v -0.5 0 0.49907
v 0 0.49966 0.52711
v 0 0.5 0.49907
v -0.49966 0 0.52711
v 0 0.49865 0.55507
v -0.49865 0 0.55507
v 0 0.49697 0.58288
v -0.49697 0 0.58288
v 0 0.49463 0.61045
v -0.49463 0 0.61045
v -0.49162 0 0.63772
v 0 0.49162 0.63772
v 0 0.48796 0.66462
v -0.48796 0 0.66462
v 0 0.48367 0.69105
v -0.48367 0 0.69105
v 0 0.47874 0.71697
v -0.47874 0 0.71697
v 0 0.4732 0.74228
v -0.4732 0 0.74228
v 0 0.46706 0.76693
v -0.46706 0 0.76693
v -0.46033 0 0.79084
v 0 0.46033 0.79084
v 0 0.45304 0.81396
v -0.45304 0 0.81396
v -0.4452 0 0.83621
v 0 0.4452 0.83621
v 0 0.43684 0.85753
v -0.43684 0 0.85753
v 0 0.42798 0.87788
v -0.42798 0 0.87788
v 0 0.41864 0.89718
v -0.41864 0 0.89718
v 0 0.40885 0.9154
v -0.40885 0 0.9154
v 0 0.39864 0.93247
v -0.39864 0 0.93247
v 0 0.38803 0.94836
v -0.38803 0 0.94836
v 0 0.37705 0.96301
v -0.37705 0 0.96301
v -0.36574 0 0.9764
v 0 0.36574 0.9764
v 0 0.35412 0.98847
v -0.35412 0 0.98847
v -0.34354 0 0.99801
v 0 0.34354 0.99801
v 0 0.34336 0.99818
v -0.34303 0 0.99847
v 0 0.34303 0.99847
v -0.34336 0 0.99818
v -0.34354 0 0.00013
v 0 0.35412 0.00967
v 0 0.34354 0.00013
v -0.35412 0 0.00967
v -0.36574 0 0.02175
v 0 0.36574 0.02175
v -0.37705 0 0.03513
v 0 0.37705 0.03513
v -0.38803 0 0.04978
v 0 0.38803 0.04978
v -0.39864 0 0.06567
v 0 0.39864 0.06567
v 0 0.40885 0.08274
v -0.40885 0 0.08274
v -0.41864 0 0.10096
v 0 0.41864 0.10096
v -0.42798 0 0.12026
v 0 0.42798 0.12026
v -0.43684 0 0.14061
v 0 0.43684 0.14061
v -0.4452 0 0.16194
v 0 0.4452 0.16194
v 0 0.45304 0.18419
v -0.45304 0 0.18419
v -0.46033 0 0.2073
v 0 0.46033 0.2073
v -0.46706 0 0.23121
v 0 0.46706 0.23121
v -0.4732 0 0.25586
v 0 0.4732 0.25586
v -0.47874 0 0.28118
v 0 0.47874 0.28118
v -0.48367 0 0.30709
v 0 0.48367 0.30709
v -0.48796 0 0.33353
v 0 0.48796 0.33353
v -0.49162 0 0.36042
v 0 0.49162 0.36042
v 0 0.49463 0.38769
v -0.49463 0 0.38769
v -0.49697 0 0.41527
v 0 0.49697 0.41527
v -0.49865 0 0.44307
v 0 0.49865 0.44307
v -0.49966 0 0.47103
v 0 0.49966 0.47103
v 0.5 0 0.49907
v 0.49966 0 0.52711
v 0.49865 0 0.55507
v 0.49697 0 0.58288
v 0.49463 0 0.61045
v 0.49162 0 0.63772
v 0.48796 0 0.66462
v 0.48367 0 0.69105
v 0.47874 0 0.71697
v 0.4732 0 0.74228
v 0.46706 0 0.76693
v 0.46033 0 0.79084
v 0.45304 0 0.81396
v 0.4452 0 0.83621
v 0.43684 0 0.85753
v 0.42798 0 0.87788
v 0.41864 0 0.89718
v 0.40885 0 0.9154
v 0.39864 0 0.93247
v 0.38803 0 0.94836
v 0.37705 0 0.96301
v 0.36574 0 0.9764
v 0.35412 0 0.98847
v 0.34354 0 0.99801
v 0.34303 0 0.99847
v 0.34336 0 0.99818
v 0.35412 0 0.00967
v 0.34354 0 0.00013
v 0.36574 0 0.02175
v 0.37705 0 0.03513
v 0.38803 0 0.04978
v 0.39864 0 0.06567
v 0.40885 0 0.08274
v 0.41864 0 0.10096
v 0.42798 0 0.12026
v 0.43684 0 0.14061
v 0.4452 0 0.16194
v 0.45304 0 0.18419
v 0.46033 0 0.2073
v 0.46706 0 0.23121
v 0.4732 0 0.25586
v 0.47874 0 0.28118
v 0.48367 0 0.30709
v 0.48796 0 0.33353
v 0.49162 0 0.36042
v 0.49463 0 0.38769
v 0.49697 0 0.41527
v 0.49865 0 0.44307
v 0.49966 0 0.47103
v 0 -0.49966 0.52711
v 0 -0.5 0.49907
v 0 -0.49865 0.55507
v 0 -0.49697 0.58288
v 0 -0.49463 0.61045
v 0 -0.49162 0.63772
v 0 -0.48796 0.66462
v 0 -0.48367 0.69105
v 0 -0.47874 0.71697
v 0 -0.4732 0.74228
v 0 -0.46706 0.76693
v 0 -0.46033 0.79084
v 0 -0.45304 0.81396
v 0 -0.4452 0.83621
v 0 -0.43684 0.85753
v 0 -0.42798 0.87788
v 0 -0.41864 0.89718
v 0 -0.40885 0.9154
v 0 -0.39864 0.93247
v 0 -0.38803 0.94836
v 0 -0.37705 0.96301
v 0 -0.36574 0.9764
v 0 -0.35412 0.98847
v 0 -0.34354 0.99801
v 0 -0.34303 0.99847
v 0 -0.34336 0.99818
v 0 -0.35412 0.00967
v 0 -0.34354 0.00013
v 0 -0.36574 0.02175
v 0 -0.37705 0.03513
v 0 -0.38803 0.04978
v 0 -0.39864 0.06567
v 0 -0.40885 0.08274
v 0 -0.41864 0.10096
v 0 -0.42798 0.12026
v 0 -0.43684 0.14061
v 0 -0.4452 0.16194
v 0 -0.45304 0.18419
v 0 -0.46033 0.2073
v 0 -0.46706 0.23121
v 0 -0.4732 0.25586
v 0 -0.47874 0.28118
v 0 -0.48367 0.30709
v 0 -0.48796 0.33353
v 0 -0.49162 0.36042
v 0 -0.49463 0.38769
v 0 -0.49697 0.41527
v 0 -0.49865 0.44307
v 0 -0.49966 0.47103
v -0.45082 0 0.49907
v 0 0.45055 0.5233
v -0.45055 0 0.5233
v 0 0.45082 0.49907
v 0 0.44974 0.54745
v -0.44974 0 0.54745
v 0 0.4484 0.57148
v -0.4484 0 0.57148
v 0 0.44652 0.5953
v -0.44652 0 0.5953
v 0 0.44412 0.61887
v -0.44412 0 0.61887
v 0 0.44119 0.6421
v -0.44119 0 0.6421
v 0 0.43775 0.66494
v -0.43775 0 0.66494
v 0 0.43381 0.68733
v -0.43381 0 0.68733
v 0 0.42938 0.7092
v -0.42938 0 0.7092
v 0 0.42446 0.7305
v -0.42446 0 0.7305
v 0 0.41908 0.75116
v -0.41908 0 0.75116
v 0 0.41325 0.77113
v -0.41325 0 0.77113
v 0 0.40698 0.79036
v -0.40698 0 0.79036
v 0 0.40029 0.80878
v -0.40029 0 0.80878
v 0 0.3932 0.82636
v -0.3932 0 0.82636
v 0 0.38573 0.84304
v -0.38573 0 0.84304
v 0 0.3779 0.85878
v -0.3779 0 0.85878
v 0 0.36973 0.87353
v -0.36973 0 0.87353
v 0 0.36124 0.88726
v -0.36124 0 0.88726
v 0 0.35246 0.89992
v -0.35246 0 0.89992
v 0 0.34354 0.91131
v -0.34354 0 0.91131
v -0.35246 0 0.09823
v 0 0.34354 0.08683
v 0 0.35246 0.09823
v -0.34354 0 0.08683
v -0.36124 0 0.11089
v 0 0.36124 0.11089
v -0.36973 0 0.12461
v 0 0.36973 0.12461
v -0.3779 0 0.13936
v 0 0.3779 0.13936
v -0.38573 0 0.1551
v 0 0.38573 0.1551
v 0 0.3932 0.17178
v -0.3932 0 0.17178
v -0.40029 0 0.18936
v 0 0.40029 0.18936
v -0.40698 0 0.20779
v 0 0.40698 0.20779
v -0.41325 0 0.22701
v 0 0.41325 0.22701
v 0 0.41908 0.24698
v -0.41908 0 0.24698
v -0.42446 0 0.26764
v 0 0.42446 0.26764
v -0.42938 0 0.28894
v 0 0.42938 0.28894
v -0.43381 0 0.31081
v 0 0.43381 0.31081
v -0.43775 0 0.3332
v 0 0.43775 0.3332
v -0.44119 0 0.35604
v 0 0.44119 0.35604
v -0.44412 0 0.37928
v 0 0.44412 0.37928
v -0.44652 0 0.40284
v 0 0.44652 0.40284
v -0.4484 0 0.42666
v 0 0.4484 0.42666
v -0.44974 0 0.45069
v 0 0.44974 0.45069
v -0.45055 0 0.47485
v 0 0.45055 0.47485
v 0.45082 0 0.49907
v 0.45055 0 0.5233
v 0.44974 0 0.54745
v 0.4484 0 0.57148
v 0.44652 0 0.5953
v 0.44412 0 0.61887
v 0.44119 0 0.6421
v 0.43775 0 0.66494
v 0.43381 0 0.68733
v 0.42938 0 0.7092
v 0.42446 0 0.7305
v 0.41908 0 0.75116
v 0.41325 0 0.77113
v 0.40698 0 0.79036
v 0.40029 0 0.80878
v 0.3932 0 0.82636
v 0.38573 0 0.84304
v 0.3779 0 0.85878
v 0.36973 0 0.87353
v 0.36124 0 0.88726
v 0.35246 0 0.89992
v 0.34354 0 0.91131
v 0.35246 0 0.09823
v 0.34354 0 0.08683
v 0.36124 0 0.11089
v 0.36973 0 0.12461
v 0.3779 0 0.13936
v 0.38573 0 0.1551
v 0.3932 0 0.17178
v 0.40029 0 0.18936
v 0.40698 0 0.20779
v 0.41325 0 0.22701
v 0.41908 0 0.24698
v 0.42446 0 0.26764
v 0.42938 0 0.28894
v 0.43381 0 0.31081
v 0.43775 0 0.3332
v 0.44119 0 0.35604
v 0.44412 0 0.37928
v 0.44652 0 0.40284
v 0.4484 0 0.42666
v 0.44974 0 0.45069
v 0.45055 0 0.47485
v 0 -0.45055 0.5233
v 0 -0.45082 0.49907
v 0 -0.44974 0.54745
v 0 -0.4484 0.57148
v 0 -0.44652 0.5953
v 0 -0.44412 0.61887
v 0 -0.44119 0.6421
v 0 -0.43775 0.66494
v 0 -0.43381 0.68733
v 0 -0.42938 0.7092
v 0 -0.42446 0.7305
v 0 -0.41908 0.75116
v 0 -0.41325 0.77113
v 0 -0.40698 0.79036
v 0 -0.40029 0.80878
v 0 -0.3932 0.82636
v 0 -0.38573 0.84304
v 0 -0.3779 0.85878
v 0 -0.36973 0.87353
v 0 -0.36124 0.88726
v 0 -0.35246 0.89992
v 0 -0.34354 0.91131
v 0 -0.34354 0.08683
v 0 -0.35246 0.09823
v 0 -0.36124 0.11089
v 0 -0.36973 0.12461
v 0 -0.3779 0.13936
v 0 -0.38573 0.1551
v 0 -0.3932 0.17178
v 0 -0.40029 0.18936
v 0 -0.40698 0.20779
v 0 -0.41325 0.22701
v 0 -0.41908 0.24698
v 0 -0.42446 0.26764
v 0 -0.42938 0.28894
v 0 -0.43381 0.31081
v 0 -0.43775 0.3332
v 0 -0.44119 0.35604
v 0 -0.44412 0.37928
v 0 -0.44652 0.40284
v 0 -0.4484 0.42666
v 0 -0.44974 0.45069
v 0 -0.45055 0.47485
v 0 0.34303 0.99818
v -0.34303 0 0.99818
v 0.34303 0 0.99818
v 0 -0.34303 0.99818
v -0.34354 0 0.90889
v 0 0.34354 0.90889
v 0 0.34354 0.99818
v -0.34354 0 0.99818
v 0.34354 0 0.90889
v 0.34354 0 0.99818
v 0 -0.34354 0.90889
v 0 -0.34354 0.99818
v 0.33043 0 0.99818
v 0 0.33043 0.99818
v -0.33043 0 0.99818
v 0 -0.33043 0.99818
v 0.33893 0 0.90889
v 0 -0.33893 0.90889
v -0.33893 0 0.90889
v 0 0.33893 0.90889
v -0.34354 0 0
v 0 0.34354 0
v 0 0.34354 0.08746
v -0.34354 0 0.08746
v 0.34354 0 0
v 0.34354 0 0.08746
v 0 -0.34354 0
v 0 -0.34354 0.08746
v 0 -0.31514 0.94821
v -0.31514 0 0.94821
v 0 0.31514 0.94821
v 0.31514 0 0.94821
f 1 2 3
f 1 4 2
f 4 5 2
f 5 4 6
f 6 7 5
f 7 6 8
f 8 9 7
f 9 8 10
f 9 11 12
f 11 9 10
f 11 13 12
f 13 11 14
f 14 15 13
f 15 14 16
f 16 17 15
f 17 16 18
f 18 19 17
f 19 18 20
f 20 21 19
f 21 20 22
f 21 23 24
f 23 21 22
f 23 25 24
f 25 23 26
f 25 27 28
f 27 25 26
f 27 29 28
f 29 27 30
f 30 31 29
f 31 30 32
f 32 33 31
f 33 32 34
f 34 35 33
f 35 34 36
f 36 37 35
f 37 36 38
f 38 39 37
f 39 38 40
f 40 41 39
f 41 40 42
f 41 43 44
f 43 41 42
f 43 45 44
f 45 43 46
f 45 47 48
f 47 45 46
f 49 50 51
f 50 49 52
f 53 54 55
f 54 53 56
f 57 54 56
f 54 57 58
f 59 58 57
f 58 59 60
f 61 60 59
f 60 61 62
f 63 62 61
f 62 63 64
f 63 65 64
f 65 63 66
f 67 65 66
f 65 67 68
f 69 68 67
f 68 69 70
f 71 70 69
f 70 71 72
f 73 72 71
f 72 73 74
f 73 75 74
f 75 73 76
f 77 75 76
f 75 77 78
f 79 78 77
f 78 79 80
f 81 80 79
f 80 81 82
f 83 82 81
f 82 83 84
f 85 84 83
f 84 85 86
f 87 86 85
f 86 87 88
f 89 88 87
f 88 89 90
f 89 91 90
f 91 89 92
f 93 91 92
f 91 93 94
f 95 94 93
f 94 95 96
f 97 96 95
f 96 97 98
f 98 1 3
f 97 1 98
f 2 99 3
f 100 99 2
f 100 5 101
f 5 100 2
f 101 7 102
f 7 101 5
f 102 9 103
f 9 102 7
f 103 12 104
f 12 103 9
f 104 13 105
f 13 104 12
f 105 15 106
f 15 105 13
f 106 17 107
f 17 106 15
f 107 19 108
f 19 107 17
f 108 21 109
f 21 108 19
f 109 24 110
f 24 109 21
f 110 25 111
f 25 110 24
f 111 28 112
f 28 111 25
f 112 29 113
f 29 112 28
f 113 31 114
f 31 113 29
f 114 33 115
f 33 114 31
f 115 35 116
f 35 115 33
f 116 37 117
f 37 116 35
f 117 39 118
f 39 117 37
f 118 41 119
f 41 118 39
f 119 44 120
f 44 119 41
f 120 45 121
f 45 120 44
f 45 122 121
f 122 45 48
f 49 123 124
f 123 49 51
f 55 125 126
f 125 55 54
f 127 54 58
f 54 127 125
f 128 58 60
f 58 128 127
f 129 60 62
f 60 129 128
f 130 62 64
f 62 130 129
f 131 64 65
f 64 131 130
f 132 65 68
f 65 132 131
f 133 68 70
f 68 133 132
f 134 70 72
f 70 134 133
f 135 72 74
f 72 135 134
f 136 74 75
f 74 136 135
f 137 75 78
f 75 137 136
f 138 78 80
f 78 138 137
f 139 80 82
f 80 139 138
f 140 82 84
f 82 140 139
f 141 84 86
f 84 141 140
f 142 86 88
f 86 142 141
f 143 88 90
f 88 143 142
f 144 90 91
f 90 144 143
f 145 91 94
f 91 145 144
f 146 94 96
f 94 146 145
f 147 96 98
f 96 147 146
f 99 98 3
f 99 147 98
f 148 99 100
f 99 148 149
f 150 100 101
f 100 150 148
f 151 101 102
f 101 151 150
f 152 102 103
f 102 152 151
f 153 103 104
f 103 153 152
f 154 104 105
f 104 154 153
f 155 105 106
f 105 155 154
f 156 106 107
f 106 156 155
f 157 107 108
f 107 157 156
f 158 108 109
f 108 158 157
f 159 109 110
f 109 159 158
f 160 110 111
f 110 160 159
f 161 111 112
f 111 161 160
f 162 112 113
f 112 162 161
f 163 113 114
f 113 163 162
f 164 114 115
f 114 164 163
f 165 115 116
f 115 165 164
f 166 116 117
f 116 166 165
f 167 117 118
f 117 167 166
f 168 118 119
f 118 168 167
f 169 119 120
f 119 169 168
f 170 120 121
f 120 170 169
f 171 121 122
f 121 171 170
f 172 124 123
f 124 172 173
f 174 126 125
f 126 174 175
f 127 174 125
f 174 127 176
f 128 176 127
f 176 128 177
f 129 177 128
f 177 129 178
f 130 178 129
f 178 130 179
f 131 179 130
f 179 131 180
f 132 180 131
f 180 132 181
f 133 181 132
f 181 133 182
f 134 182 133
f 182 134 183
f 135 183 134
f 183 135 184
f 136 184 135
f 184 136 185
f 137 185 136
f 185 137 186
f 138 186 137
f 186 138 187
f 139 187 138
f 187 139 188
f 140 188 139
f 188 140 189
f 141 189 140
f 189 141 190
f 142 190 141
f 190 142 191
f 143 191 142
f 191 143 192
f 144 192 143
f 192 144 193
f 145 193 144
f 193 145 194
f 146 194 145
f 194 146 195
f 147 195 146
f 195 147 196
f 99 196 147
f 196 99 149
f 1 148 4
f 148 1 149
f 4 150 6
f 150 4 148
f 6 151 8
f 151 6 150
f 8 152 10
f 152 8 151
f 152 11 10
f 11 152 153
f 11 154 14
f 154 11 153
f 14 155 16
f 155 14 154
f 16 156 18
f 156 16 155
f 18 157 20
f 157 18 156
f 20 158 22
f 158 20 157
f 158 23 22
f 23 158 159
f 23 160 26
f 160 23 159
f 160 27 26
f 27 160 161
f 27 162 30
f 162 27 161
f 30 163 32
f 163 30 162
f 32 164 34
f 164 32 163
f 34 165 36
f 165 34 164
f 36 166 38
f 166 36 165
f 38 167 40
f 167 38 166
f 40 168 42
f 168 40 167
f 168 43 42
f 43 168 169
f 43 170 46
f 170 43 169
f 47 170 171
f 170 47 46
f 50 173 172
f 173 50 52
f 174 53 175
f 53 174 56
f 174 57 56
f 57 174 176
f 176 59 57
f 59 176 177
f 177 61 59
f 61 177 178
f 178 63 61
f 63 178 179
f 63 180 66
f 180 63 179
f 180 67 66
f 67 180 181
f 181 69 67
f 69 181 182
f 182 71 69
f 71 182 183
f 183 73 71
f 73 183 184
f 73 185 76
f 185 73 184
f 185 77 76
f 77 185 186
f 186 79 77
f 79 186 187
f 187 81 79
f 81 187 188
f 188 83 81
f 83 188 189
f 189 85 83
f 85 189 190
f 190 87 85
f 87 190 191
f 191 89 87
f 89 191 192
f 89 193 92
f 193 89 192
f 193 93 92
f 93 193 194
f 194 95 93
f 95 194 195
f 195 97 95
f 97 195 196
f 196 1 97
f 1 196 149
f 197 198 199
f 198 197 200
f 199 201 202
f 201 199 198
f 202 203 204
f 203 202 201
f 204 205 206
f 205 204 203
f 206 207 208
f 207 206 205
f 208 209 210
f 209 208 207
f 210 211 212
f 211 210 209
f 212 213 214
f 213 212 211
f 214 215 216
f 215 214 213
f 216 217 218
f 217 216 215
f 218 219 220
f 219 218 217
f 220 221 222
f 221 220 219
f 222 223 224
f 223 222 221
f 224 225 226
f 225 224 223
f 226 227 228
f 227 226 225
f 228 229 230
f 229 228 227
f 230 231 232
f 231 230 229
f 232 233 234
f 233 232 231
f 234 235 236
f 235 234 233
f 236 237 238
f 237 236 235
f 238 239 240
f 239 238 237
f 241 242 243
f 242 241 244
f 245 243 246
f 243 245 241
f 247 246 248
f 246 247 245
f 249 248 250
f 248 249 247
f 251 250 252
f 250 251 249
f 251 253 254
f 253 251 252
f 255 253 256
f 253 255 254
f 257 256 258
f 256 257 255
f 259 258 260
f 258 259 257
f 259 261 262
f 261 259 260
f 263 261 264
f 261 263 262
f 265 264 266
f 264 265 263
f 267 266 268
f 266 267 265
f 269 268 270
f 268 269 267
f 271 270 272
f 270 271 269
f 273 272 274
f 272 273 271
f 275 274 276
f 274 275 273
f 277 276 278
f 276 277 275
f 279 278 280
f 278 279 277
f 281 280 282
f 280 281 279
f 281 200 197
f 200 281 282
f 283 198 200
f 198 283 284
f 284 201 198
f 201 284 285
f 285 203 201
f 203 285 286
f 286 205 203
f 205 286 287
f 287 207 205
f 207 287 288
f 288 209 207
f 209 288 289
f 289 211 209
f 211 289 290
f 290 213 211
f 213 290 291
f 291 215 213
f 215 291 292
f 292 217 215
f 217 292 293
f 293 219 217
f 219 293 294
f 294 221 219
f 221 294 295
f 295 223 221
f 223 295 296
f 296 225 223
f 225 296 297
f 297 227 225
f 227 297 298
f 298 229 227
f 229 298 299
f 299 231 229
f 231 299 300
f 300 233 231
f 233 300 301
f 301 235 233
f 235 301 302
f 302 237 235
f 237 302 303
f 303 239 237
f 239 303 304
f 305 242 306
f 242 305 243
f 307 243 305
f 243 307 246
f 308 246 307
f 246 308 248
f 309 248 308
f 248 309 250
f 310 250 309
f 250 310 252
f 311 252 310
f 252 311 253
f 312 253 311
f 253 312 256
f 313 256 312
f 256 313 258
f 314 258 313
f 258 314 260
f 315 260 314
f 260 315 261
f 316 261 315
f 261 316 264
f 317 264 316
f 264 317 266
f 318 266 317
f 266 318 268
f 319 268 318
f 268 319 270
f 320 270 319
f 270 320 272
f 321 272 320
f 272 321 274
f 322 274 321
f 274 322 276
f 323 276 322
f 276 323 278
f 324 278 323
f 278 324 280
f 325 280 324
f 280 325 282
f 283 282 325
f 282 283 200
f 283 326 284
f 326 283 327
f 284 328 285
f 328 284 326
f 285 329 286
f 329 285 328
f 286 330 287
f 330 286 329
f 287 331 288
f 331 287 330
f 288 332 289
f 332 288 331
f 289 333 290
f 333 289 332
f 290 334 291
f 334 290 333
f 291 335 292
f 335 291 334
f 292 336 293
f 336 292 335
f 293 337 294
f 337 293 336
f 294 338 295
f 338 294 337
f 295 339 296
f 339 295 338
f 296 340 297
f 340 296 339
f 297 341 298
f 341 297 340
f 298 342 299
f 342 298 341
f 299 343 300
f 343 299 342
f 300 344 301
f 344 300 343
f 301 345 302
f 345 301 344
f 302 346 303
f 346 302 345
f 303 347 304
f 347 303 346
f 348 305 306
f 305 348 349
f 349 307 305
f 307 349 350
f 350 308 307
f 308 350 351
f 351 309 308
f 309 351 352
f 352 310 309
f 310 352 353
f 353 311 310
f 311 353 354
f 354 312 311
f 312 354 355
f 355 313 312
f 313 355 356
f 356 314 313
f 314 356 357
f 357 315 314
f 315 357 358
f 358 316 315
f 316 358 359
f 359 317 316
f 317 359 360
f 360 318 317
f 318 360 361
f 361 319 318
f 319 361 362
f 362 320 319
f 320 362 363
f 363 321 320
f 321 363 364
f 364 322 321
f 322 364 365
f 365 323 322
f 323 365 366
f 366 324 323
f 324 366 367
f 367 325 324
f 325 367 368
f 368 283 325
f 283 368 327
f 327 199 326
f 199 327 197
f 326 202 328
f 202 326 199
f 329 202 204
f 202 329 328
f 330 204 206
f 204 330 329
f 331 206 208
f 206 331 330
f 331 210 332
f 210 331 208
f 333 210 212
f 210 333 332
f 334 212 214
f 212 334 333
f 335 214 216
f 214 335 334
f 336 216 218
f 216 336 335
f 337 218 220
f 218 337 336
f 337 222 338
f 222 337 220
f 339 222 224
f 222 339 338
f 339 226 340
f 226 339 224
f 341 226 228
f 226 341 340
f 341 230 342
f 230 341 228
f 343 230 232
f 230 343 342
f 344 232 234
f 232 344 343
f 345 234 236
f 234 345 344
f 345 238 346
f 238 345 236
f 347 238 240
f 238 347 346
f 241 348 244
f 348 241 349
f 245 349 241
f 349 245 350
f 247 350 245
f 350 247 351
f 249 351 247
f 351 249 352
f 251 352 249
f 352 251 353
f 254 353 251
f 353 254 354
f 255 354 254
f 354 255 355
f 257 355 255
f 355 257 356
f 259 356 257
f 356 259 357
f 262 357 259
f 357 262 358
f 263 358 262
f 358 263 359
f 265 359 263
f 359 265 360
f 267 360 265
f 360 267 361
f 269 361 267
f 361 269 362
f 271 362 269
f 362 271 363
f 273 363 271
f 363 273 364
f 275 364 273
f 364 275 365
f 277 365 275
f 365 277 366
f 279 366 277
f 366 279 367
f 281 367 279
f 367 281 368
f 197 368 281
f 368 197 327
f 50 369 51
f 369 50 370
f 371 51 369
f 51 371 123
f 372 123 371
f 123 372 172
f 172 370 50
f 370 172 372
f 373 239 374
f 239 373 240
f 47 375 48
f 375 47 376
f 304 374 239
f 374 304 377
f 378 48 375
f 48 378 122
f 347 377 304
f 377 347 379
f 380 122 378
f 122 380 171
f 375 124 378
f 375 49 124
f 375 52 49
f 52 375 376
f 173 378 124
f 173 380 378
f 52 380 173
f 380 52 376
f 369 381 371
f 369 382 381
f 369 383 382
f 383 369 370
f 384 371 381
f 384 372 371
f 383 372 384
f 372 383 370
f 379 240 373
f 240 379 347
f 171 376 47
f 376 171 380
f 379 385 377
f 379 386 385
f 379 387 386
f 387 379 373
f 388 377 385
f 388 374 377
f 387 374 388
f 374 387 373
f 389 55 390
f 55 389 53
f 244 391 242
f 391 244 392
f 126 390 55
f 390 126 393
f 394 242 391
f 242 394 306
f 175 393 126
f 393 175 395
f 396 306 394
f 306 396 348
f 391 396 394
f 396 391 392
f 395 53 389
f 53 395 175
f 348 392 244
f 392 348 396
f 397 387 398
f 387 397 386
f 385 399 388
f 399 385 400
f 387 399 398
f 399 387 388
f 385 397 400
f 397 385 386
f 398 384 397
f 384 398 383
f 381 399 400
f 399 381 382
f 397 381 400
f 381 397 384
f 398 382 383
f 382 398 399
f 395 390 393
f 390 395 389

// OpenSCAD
// [FL_INDEX: keywords="openscad, 3d_parametric, Customizer-able_Containers, csg_solid" | COT="Parametric OpenSCAD design from 3DCodeverse"]
// Title: Customizer-able Containers


// The shape of pot you'd like
potShape = 0; // [0:14]

// The number of sides (0 for Cylindrical)
numberSides = 4; // [0:100]

drawReceptacle(potShape,numberSides);

module hSphere(r=1,t=0.1,ns,rot) {
	difference() {
		sphere(r);
		sphere(r-t);
	}
}

rotationList=[0,0,0,60,0,-36,60,180/7,0,-20,36,180/11,0,-180/13,180/7,12,0,0,0,0,0,0];

module drawReceptacle(number,sides) {
	ns=(sides<3)?100:sides;
	rotby=(ns>20)?0:rotationList[ns];

		if (number==1) { receptacle3(ns,rotby);
	} else if (number==2) { receptacle1(ns,rotby);
	} else if (number==3) { receptacle2(ns,rotby);
	} else if (number==4) { receptacle5(ns,rotby);
	} else if (number==5) { receptacle6(ns,rotby);
	} else if (number==6) { receptacle7(ns,rotby);
	} else if (number==7) { receptacle4(ns,rotby);
	} else if (number==8) { receptacle8(ns,rotby);
	} else if (number==9) { receptacle9(ns,rotby);
	} else if (number==10) { receptacle10(ns,rotby);
	} else if (number==11) { receptacle11(ns,rotby);
	} else if (number==12) { receptacle14(ns,rotby);
	} else if (number==13) { receptacle12(ns,rotby);
	} else if (number==14) { receptacle13(ns,rotby);
	} else { 
		 receptacle0(ns,rotby);
	}	
}

diameter=50;
height=100;
quality=120;
$fn=quality;
numbsides=100; rotation=0;


module hSphere(r=1,t=0.1,ns,rot) {
	difference() {
		sphere(r);
		sphere(r-t);
	}
}
module hTorus(r=1,t=0.1,ns,rot) {
	scale([1,1,2])difference() {
		rotate([0,0,rot]) rotate_extrude(convexity=15,$fn=ns) translate([r*2/3, 0, 0]) circle(r/3,$fn=quality); 
		rotate([0,0,rot]) scale([1,1,1.2])rotate_extrude(convexity=15,$fn=ns) translate([r*2/3, 0, 0]) circle(r/3-t,$fn=quality); 
	}
}
module nTorus(r=1,t=0.1,ns,rot) {
	scale([1,1,2])difference() {
		rotate([0,0,rot]) rotate_extrude(convexity=15,$fn=ns) translate([r*2/3, 0, 0]) circle(r/3,$fn=quality); 
		rotate([0,0,rot]) scale([1,1,1.1])rotate_extrude(convexity=15,$fn=ns) translate([r*2/3, 0, 0]) circle(r/3-t,$fn=quality); 
	}
}

module receptacle0(ns,rot) {
	intersection() { translate([0,0,0.5])cube(1,center=true);
		scale([1/122,1/122,1/112])translate([0,0,-2.64])difference() {
			scale([1,1,2]) translate([0,0,((30+6)*2*0.813)/2]) union() {
				difference() {
					rotate([0,0,rot]) { rotate_extrude(convexity = 10,$fn=ns) translate([31, 0, 0]) circle(30,$fn=quality);  }
					rotate([0,0,rot]) { scale([1,1,1.08]) rotate_extrude(convexity = 10,$fn=ns) translate([31, 0, 0]) circle(24,$fn=quality); }
					cylinder(31*2.5,31*1.35,31*1.35,center=true,$fn=ns);
				}
				translate([0,0,22.95])cylinder(5,31*1.352,31*1.352,$fn=ns);
				translate([0,0,0-27.95])cylinder(4.9,31*1.352,31*1.352,$fn=ns);
			}
			translate([0,0,108])cylinder(9.1,42,36,center=true,$fn=ns);
			translate([0,0,112])cylinder(9,38,41,center=true,$fn=ns);
		}
	}
}
module receptacle1(ns,rot) {
	intersection() { translate([0,0,0.5])cube(1,center=true);
		scale([1/2,1/2,1/2])translate([0,0,0.5]) union() {
			difference() {
				hTorus(1,0.1,ns,rot);
				cylinder(1.8,0.83,0.83,center=true,$fn=ns);
			}
			scale([1.67,1.67,1]) translate([0,0,-0.5275]) cylinder(0.1,0.498,0.498,center=true,$fn=ns);
		
			difference() {
				union() {
					scale([1.67,1.67,1]) translate([0,0,0.96])  {
						intersection() {
							hTorus(1,0.1,ns,rot);
							cylinder(1.5,0.5,0.5,center=true,$fn=ns);
						}
					}
					rotate([0,0,rot]) translate([0,0,1.442])rotate_extrude(convexity = 10,$fn=ns) translate([0.83, 0, 0]) scale([0.4,1,1])circle(0.1,$fn=quality); 
				}
				union() {
					translate([0,0,0.6])cylinder(0.5,0.85,0.61,center=true,$fn=ns);
					translate([0,0,0.05])cylinder(0.6,0.85,0.85,center=true,$fn=ns);
				}
			}
		}
	}
}
module receptacle2(ns,rot) {
	intersection() { translate([0,0,0.5])cube(1,center=true);
		scale([1/2,1/2,1/3])translate([0,0,0.5]) union() {
			difference() {
				hTorus(1,0.1,ns,rot);
				cylinder(1.8,0.83,0.83,center=true,$fn=ns);
			}
			scale([1.67,1.67,1]) translate([0,0,-0.5275]) cylinder(0.1,0.498,0.498,center=true,$fn=ns);
		
			difference() {
				scale([1,1,2]) union() {
					scale([1.67,1.67,1]) translate([0,0,0.96+((2-1)*-0.29)])  {
						intersection() {
							hTorus(1,0.1,ns,rot);
							cylinder(1.5,0.5,0.5,center=true,$fn=ns);
						}
					}
					rotate([0,0,rot]) translate([0,0,1.442+((2-1)*-0.29)])rotate_extrude(convexity = 10,$fn=ns) translate([0.83, 0, 0]) scale([0.4,1,1])circle(0.1,$fn=quality); 
				}
				union() {
					translate([0,0,0.6])cylinder(0.5,0.85,0.61,center=true,$fn=ns);
					translate([0,0,0.05])cylinder(0.6,0.85,0.85,center=true,$fn=ns);
				}
			}
		}
	}
}
module receptacle3(ns,rot) {
	intersection() { translate([0,0,0.5])cube(1,center=true);
		scale([1/2,1/2,1/1.75])translate([0,0,0.5]) union() {
			difference() {
				hTorus(1,0.1,ns,rot);
				cylinder(1.8,0.83,0.83,center=true,$fn=ns);
			}
			scale([1.67,1.67,1]) translate([0,0,-0.5275]) cylinder(0.1,0.498,0.498,center=true,$fn=ns);
		
			difference() {
				scale([1,1,0.7]) union() {
					scale([1.67,1.67,1]) translate([0,0,1.215])  {
						intersection() {
							hTorus(1,0.1,ns,rot);
							cylinder(1.5,0.5,0.5,center=true,$fn=ns);
						}
					}
					rotate([0,0,rot]) translate([0,0,1.697])rotate_extrude(convexity = 10,$fn=ns) translate([0.83, 0, 0]) scale([0.4,1,1])circle(0.1,$fn=quality); 
				}
				union() {
					translate([0,0,0.6])cylinder(0.5,0.85,0.61,center=true,$fn=ns);
					translate([0,0,0.05])cylinder(0.6,0.85,0.85,center=true,$fn=ns);
				}
			}
		}
	}
}
module receptacle4(ns,rot) {
	intersection() {
		scale([0.5,0.5,0.47])translate([0,0,0.57]) union() {
			difference() {
				hTorus(1,0.1,ns,rot);
				translate([0,0,-1.38])cylinder(1.8,0.83,0.83,center=true,$fn=ns);
				cylinder(1.8,0.65,0.65,center=true,$fn=ns);
				translate([0,0,0.5])cylinder(1,1.1,1.1,center=true,$fn=ns);
			}
			scale([1.67,1.67,1]) translate([0,0,-0.5275]) cylinder(0.1,0.498,0.498,center=true,$fn=ns);
			translate([0,0,0.75])difference() {
				cylinder(1.5,1,1,center=true,$fn=ns);
				cylinder(2,0.9,0.9,center=true,$fn=ns);
			}
			rotate([0,0,rot]) translate([0,0,1.5])rotate_extrude(convexity = 10,$fn=ns) translate([0.95, 0, 0]) circle(0.05,$fn=quality); 
		}
		translate([0,0,0.5]) cube(1,center=true);
	}
}
module receptacle5(ns,rot) {
	intersection() {
		scale([0.39,0.39,0.445])translate([0,0,0.5752]) union() {
			difference() {
				hTorus(1,0.1,ns,rot);
				translate([0,0,-1.38])cylinder(1.8,0.83,0.83,center=true,$fn=ns);
				cylinder(1.8,0.65,0.65,center=true,$fn=ns);
				translate([0,0,0.5])cylinder(1,1.1,1.1,center=true,$fn=ns);
			}
			scale([1.67,1.67,1]) translate([0,0,-0.5275]) cylinder(0.1,0.498,0.498,center=true,$fn=ns);
			translate([0,0,0.5])difference() {
				cylinder(1,1,1,center=true,$fn=ns);
				cylinder(2,0.9,0.9,center=true,$fn=ns);
			}
			rotate([0,0,rot]) translate([0,0,1.61])rotate_extrude(convexity = 10,$fn=ns) translate([1.24, 0, 0]) scale([1,3,1])circle(0.025,$fn=quality); 
			scale([2.515,2.515,2])translate([0,0,0.25]) intersection() {
					nTorus(1,0.041,ns,rot);
					cylinder(1.5,0.5,0.5,center=true,$fn=ns);
					translate([0,0,0.5])cylinder(0.5,1,1,center=true,$fn=ns);
				}
		}
		translate([0,0,0.5]) cube(1,center=true);
	}
}
module receptacle6(ns,rot) {
	intersection() {
		scale([0.39,0.39,0.57])translate([0,0,0.5752]) union() {
			difference() {
				hTorus(1,0.1,ns,rot);
				translate([0,0,-1.38])cylinder(1.8,0.83,0.83,center=true,$fn=ns);
				cylinder(1.8,0.65,0.65,center=true,$fn=ns);
				translate([0,0,0.5])cylinder(1,1.1,1.1,center=true,$fn=ns);
			}
			scale([1.67,1.67,1]) translate([0,0,-0.5275]) cylinder(0.1,0.498,0.498,center=true,$fn=ns);
			translate([0,0,0.25])difference() {
				cylinder(0.5,1,1,center=true,$fn=ns);
				cylinder(2,0.9,0.9,center=true,$fn=ns);
			}
			rotate([0,0,rot]) translate([0,0,1.11])rotate_extrude(convexity = 10,$fn=ns) translate([1.24, 0, 0]) scale([1,3,1])circle(0.025,$fn=quality); 
			scale([2.515,2.515,2])translate([0,0,0]) intersection() {
					nTorus(1,0.041,ns,rot);
					cylinder(1.5,0.5,0.5,center=true,$fn=ns);
					translate([0,0,0.5])cylinder(0.5,1,1,center=true,$fn=ns);
				}
		}
		translate([0,0,0.5]) cube(1,center=true);
	}
}
module receptacle7(ns,rot) {
	intersection() {
		scale([0.39,0.39,0.8])translate([0,0,0.5752]) union() {
			difference() {
				hTorus(1,0.1,ns,rot);
				translate([0,0,-1.38])cylinder(1.8,0.83,0.83,center=true,$fn=ns);
				cylinder(1.8,0.65,0.65,center=true,$fn=ns);
				translate([0,0,0.5])cylinder(1,1.1,1.1,center=true,$fn=ns);
			}
			scale([1.67,1.67,1]) translate([0,0,-0.5275]) cylinder(0.1,0.498,0.498,center=true,$fn=ns);
			rotate([0,0,rot]) translate([0,0,0.61])rotate_extrude(convexity = 10,$fn=ns) translate([1.24, 0, 0]) scale([1,3,1])circle(0.025,$fn=quality); 
			scale([2.515,2.515,2])translate([0,0,-0.25]) intersection() {
					nTorus(1,0.041,ns,rot);
					cylinder(1.5,0.5,0.5,center=true,$fn=ns);
					translate([0,0,0.5])cylinder(0.5,1,1,center=true,$fn=ns);
				}
		}
		translate([0,0,0.5]) cube(1,center=true);
	}
}
module receptacle8(ns,rot) {
	intersection() {
		scale([0.5,0.5,0.48])translate([0,0,0.5]) union() {
			translate([0,0,0.25])difference() {
				cylinder(1.5,1,1,center=true,$fn=ns);
				cylinder(2,0.9,0.9,center=true,$fn=ns);
			}
			translate([0,0,-0.45]) cylinder(0.1,1,1,center=true,$fn=ns);
			translate([0,0,1])rotate([180,0,0])difference() {
				hTorus(1,0.1,ns,rot);
				translate([0,0,-1.25])cylinder(1.8,0.83,0.83,center=true,$fn=ns);
				cylinder(1.8,0.65,0.65,center=true,$fn=ns);
				translate([0,0,0.5])cylinder(1,1.1,1.1,center=true,$fn=ns);
			}
			rotate([0,0,rot]) translate([0,0,1.493])rotate_extrude(convexity = 10,$fn=ns) translate([0.83, 0, 0]) scale([1,3.5,1])circle(0.025,$fn=quality); 
		}
		translate([0,0,0.5]) cube(1,center=true);
	}
}

module receptacle9(ns,rot) {
	intersection() {
		scale([0.5,0.5,0.48])translate([0,0,0.5]) union() {
			translate([0,0,0.25])difference() {
				cylinder(2.5,1,1,center=true,$fn=ns);
				cylinder(2.6,0.9,0.9,center=true,$fn=ns);
			}
			translate([0,0,-0.45]) cylinder(0.1,1,1,center=true,$fn=ns);
			rotate([0,0,rot]) translate([0,0,1.5])rotate_extrude(convexity = 10,$fn=ns) translate([0.95, 0, 0]) circle(0.05,$fn=quality); 
		}
		translate([0,0,0.5]) cube(1,center=true);
	}
}

module receptacle10(ns,rot) {
	intersection() {
		scale([0.5,0.5,0.48])translate([0,0,0.5]) union() {
			scale([2,2,2])translate([0,0,0.25]) intersection() {
					nTorus(1,0.041,ns,rot);
					cylinder(1.5,0.5,0.5,center=true,$fn=ns);
					translate([0,0,0.5])cylinder(0.5,1,1,center=true,$fn=ns);
				}
			translate([0,0,0.25])difference() {
				cylinder(1.5,0.795,0.795,center=true,$fn=ns);
				cylinder(2.1,0.717,0.717,center=true,$fn=ns);
			}
			translate([0,0,-0.45]) cylinder(0.1,0.795,0.795,center=true,$fn=ns);
		}
		translate([0,0,0.5]) cube(1,center=true);
	}
}
module receptacle11(ns,rot) {
	intersection() {
		scale([0.5,0.5,0.48])translate([0,0,0.5]) union() {
			scale([2,2,2])translate([0,0,0.25]) intersection() {
					nTorus(1,0.041,ns,rot);
					cylinder(1.5,0.5,0.5,center=true,$fn=ns);
					translate([0,0,-0.5])cylinder(0.5,1,1,center=true,$fn=ns);
				}
			translate([0,0,0.75])difference() {
				cylinder(1.5,0.795,0.795,center=true,$fn=ns);
				cylinder(2.1,0.717,0.717,center=true,$fn=ns);
			}
			translate([0,0,-0.45]) cylinder(0.1,0.95,0.9,center=true,$fn=ns);
			rotate([0,0,rot]) translate([0,0,1.5])rotate_extrude(convexity = 10,$fn=ns) translate([0.76, 0, 0]) circle(0.035,$fn=quality); 
		}
		translate([0,0,0.5]) cube(1,center=true);
	}
}
module receptacle12(ns,rot) {
	intersection() {
		scale([0.5,0.5,0.48])translate([0,0,0.5]) union() {
			translate([0,0,0.25])difference() {
				cylinder(2.5,0.5,1,center=true,$fn=ns);
				cylinder(2.6,0.4,0.9,center=true,$fn=ns);
			}
			translate([0,0,-0.45]) cylinder(0.1,0.55,0.55,center=true,$fn=ns);
			rotate([0,0,rot]) translate([0,0,1.5])rotate_extrude(convexity = 10,$fn=ns) translate([0.947, 0, 0]) circle(0.052,$fn=quality); 
		}
		translate([0,0,0.5]) cube(1,center=true);
	}
}
module receptacle13(ns,rot) {
	intersection() {
		scale([0.5,0.5,0.48])translate([0,0,0.5]) union() {
			translate([0,0,0.25])difference() {
				cylinder(2.5,1,0.6,center=true,$fn=ns);
				cylinder(2.6,0.9,0.5,center=true,$fn=ns);
			}
			translate([0,0,-0.45]) cylinder(0.1,0.9,0.9,center=true,$fn=ns);
			rotate([0,0,rot]) translate([0,0,1.5])rotate_extrude(convexity = 10,$fn=ns) translate([0.554, 0, 0]) circle(0.045,$fn=quality); 
		}
		translate([0,0,0.5]) cube(1,center=true);
	}
}

module receptacle14(ns,rot) {
	intersection() {
		scale([0.5,0.5,0.48])translate([0,0,0.5]) union() {
			scale([2,2,2])translate([0,0,0.25]) intersection() {
					nTorus(1,0.041,ns,rot);
					cylinder(1.5,0.5,0.5,center=true,$fn=ns);
					translate([0,0,0.5])cylinder(0.5,1,1,center=true,$fn=ns);
				}
			translate([0,0,0.5])difference() {
				cylinder(1,0.795,0.795,center=true,$fn=ns);
				cylinder(2.1,0.717,0.717,center=true,$fn=ns);
			}
			scale([2,2,2])translate([0,0,0.25]) intersection() {
					nTorus(1,0.041,ns,rot);
					cylinder(1.5,0.5,0.5,center=true,$fn=ns);
					translate([0,0,-0.5])cylinder(0.5,1,1,center=true,$fn=ns);
				}
			translate([0,0,-0.45]) cylinder(0.1,0.95,0.9,center=true,$fn=ns);
		}
		translate([0,0,0.5]) cube(1,center=true);
	}
}
